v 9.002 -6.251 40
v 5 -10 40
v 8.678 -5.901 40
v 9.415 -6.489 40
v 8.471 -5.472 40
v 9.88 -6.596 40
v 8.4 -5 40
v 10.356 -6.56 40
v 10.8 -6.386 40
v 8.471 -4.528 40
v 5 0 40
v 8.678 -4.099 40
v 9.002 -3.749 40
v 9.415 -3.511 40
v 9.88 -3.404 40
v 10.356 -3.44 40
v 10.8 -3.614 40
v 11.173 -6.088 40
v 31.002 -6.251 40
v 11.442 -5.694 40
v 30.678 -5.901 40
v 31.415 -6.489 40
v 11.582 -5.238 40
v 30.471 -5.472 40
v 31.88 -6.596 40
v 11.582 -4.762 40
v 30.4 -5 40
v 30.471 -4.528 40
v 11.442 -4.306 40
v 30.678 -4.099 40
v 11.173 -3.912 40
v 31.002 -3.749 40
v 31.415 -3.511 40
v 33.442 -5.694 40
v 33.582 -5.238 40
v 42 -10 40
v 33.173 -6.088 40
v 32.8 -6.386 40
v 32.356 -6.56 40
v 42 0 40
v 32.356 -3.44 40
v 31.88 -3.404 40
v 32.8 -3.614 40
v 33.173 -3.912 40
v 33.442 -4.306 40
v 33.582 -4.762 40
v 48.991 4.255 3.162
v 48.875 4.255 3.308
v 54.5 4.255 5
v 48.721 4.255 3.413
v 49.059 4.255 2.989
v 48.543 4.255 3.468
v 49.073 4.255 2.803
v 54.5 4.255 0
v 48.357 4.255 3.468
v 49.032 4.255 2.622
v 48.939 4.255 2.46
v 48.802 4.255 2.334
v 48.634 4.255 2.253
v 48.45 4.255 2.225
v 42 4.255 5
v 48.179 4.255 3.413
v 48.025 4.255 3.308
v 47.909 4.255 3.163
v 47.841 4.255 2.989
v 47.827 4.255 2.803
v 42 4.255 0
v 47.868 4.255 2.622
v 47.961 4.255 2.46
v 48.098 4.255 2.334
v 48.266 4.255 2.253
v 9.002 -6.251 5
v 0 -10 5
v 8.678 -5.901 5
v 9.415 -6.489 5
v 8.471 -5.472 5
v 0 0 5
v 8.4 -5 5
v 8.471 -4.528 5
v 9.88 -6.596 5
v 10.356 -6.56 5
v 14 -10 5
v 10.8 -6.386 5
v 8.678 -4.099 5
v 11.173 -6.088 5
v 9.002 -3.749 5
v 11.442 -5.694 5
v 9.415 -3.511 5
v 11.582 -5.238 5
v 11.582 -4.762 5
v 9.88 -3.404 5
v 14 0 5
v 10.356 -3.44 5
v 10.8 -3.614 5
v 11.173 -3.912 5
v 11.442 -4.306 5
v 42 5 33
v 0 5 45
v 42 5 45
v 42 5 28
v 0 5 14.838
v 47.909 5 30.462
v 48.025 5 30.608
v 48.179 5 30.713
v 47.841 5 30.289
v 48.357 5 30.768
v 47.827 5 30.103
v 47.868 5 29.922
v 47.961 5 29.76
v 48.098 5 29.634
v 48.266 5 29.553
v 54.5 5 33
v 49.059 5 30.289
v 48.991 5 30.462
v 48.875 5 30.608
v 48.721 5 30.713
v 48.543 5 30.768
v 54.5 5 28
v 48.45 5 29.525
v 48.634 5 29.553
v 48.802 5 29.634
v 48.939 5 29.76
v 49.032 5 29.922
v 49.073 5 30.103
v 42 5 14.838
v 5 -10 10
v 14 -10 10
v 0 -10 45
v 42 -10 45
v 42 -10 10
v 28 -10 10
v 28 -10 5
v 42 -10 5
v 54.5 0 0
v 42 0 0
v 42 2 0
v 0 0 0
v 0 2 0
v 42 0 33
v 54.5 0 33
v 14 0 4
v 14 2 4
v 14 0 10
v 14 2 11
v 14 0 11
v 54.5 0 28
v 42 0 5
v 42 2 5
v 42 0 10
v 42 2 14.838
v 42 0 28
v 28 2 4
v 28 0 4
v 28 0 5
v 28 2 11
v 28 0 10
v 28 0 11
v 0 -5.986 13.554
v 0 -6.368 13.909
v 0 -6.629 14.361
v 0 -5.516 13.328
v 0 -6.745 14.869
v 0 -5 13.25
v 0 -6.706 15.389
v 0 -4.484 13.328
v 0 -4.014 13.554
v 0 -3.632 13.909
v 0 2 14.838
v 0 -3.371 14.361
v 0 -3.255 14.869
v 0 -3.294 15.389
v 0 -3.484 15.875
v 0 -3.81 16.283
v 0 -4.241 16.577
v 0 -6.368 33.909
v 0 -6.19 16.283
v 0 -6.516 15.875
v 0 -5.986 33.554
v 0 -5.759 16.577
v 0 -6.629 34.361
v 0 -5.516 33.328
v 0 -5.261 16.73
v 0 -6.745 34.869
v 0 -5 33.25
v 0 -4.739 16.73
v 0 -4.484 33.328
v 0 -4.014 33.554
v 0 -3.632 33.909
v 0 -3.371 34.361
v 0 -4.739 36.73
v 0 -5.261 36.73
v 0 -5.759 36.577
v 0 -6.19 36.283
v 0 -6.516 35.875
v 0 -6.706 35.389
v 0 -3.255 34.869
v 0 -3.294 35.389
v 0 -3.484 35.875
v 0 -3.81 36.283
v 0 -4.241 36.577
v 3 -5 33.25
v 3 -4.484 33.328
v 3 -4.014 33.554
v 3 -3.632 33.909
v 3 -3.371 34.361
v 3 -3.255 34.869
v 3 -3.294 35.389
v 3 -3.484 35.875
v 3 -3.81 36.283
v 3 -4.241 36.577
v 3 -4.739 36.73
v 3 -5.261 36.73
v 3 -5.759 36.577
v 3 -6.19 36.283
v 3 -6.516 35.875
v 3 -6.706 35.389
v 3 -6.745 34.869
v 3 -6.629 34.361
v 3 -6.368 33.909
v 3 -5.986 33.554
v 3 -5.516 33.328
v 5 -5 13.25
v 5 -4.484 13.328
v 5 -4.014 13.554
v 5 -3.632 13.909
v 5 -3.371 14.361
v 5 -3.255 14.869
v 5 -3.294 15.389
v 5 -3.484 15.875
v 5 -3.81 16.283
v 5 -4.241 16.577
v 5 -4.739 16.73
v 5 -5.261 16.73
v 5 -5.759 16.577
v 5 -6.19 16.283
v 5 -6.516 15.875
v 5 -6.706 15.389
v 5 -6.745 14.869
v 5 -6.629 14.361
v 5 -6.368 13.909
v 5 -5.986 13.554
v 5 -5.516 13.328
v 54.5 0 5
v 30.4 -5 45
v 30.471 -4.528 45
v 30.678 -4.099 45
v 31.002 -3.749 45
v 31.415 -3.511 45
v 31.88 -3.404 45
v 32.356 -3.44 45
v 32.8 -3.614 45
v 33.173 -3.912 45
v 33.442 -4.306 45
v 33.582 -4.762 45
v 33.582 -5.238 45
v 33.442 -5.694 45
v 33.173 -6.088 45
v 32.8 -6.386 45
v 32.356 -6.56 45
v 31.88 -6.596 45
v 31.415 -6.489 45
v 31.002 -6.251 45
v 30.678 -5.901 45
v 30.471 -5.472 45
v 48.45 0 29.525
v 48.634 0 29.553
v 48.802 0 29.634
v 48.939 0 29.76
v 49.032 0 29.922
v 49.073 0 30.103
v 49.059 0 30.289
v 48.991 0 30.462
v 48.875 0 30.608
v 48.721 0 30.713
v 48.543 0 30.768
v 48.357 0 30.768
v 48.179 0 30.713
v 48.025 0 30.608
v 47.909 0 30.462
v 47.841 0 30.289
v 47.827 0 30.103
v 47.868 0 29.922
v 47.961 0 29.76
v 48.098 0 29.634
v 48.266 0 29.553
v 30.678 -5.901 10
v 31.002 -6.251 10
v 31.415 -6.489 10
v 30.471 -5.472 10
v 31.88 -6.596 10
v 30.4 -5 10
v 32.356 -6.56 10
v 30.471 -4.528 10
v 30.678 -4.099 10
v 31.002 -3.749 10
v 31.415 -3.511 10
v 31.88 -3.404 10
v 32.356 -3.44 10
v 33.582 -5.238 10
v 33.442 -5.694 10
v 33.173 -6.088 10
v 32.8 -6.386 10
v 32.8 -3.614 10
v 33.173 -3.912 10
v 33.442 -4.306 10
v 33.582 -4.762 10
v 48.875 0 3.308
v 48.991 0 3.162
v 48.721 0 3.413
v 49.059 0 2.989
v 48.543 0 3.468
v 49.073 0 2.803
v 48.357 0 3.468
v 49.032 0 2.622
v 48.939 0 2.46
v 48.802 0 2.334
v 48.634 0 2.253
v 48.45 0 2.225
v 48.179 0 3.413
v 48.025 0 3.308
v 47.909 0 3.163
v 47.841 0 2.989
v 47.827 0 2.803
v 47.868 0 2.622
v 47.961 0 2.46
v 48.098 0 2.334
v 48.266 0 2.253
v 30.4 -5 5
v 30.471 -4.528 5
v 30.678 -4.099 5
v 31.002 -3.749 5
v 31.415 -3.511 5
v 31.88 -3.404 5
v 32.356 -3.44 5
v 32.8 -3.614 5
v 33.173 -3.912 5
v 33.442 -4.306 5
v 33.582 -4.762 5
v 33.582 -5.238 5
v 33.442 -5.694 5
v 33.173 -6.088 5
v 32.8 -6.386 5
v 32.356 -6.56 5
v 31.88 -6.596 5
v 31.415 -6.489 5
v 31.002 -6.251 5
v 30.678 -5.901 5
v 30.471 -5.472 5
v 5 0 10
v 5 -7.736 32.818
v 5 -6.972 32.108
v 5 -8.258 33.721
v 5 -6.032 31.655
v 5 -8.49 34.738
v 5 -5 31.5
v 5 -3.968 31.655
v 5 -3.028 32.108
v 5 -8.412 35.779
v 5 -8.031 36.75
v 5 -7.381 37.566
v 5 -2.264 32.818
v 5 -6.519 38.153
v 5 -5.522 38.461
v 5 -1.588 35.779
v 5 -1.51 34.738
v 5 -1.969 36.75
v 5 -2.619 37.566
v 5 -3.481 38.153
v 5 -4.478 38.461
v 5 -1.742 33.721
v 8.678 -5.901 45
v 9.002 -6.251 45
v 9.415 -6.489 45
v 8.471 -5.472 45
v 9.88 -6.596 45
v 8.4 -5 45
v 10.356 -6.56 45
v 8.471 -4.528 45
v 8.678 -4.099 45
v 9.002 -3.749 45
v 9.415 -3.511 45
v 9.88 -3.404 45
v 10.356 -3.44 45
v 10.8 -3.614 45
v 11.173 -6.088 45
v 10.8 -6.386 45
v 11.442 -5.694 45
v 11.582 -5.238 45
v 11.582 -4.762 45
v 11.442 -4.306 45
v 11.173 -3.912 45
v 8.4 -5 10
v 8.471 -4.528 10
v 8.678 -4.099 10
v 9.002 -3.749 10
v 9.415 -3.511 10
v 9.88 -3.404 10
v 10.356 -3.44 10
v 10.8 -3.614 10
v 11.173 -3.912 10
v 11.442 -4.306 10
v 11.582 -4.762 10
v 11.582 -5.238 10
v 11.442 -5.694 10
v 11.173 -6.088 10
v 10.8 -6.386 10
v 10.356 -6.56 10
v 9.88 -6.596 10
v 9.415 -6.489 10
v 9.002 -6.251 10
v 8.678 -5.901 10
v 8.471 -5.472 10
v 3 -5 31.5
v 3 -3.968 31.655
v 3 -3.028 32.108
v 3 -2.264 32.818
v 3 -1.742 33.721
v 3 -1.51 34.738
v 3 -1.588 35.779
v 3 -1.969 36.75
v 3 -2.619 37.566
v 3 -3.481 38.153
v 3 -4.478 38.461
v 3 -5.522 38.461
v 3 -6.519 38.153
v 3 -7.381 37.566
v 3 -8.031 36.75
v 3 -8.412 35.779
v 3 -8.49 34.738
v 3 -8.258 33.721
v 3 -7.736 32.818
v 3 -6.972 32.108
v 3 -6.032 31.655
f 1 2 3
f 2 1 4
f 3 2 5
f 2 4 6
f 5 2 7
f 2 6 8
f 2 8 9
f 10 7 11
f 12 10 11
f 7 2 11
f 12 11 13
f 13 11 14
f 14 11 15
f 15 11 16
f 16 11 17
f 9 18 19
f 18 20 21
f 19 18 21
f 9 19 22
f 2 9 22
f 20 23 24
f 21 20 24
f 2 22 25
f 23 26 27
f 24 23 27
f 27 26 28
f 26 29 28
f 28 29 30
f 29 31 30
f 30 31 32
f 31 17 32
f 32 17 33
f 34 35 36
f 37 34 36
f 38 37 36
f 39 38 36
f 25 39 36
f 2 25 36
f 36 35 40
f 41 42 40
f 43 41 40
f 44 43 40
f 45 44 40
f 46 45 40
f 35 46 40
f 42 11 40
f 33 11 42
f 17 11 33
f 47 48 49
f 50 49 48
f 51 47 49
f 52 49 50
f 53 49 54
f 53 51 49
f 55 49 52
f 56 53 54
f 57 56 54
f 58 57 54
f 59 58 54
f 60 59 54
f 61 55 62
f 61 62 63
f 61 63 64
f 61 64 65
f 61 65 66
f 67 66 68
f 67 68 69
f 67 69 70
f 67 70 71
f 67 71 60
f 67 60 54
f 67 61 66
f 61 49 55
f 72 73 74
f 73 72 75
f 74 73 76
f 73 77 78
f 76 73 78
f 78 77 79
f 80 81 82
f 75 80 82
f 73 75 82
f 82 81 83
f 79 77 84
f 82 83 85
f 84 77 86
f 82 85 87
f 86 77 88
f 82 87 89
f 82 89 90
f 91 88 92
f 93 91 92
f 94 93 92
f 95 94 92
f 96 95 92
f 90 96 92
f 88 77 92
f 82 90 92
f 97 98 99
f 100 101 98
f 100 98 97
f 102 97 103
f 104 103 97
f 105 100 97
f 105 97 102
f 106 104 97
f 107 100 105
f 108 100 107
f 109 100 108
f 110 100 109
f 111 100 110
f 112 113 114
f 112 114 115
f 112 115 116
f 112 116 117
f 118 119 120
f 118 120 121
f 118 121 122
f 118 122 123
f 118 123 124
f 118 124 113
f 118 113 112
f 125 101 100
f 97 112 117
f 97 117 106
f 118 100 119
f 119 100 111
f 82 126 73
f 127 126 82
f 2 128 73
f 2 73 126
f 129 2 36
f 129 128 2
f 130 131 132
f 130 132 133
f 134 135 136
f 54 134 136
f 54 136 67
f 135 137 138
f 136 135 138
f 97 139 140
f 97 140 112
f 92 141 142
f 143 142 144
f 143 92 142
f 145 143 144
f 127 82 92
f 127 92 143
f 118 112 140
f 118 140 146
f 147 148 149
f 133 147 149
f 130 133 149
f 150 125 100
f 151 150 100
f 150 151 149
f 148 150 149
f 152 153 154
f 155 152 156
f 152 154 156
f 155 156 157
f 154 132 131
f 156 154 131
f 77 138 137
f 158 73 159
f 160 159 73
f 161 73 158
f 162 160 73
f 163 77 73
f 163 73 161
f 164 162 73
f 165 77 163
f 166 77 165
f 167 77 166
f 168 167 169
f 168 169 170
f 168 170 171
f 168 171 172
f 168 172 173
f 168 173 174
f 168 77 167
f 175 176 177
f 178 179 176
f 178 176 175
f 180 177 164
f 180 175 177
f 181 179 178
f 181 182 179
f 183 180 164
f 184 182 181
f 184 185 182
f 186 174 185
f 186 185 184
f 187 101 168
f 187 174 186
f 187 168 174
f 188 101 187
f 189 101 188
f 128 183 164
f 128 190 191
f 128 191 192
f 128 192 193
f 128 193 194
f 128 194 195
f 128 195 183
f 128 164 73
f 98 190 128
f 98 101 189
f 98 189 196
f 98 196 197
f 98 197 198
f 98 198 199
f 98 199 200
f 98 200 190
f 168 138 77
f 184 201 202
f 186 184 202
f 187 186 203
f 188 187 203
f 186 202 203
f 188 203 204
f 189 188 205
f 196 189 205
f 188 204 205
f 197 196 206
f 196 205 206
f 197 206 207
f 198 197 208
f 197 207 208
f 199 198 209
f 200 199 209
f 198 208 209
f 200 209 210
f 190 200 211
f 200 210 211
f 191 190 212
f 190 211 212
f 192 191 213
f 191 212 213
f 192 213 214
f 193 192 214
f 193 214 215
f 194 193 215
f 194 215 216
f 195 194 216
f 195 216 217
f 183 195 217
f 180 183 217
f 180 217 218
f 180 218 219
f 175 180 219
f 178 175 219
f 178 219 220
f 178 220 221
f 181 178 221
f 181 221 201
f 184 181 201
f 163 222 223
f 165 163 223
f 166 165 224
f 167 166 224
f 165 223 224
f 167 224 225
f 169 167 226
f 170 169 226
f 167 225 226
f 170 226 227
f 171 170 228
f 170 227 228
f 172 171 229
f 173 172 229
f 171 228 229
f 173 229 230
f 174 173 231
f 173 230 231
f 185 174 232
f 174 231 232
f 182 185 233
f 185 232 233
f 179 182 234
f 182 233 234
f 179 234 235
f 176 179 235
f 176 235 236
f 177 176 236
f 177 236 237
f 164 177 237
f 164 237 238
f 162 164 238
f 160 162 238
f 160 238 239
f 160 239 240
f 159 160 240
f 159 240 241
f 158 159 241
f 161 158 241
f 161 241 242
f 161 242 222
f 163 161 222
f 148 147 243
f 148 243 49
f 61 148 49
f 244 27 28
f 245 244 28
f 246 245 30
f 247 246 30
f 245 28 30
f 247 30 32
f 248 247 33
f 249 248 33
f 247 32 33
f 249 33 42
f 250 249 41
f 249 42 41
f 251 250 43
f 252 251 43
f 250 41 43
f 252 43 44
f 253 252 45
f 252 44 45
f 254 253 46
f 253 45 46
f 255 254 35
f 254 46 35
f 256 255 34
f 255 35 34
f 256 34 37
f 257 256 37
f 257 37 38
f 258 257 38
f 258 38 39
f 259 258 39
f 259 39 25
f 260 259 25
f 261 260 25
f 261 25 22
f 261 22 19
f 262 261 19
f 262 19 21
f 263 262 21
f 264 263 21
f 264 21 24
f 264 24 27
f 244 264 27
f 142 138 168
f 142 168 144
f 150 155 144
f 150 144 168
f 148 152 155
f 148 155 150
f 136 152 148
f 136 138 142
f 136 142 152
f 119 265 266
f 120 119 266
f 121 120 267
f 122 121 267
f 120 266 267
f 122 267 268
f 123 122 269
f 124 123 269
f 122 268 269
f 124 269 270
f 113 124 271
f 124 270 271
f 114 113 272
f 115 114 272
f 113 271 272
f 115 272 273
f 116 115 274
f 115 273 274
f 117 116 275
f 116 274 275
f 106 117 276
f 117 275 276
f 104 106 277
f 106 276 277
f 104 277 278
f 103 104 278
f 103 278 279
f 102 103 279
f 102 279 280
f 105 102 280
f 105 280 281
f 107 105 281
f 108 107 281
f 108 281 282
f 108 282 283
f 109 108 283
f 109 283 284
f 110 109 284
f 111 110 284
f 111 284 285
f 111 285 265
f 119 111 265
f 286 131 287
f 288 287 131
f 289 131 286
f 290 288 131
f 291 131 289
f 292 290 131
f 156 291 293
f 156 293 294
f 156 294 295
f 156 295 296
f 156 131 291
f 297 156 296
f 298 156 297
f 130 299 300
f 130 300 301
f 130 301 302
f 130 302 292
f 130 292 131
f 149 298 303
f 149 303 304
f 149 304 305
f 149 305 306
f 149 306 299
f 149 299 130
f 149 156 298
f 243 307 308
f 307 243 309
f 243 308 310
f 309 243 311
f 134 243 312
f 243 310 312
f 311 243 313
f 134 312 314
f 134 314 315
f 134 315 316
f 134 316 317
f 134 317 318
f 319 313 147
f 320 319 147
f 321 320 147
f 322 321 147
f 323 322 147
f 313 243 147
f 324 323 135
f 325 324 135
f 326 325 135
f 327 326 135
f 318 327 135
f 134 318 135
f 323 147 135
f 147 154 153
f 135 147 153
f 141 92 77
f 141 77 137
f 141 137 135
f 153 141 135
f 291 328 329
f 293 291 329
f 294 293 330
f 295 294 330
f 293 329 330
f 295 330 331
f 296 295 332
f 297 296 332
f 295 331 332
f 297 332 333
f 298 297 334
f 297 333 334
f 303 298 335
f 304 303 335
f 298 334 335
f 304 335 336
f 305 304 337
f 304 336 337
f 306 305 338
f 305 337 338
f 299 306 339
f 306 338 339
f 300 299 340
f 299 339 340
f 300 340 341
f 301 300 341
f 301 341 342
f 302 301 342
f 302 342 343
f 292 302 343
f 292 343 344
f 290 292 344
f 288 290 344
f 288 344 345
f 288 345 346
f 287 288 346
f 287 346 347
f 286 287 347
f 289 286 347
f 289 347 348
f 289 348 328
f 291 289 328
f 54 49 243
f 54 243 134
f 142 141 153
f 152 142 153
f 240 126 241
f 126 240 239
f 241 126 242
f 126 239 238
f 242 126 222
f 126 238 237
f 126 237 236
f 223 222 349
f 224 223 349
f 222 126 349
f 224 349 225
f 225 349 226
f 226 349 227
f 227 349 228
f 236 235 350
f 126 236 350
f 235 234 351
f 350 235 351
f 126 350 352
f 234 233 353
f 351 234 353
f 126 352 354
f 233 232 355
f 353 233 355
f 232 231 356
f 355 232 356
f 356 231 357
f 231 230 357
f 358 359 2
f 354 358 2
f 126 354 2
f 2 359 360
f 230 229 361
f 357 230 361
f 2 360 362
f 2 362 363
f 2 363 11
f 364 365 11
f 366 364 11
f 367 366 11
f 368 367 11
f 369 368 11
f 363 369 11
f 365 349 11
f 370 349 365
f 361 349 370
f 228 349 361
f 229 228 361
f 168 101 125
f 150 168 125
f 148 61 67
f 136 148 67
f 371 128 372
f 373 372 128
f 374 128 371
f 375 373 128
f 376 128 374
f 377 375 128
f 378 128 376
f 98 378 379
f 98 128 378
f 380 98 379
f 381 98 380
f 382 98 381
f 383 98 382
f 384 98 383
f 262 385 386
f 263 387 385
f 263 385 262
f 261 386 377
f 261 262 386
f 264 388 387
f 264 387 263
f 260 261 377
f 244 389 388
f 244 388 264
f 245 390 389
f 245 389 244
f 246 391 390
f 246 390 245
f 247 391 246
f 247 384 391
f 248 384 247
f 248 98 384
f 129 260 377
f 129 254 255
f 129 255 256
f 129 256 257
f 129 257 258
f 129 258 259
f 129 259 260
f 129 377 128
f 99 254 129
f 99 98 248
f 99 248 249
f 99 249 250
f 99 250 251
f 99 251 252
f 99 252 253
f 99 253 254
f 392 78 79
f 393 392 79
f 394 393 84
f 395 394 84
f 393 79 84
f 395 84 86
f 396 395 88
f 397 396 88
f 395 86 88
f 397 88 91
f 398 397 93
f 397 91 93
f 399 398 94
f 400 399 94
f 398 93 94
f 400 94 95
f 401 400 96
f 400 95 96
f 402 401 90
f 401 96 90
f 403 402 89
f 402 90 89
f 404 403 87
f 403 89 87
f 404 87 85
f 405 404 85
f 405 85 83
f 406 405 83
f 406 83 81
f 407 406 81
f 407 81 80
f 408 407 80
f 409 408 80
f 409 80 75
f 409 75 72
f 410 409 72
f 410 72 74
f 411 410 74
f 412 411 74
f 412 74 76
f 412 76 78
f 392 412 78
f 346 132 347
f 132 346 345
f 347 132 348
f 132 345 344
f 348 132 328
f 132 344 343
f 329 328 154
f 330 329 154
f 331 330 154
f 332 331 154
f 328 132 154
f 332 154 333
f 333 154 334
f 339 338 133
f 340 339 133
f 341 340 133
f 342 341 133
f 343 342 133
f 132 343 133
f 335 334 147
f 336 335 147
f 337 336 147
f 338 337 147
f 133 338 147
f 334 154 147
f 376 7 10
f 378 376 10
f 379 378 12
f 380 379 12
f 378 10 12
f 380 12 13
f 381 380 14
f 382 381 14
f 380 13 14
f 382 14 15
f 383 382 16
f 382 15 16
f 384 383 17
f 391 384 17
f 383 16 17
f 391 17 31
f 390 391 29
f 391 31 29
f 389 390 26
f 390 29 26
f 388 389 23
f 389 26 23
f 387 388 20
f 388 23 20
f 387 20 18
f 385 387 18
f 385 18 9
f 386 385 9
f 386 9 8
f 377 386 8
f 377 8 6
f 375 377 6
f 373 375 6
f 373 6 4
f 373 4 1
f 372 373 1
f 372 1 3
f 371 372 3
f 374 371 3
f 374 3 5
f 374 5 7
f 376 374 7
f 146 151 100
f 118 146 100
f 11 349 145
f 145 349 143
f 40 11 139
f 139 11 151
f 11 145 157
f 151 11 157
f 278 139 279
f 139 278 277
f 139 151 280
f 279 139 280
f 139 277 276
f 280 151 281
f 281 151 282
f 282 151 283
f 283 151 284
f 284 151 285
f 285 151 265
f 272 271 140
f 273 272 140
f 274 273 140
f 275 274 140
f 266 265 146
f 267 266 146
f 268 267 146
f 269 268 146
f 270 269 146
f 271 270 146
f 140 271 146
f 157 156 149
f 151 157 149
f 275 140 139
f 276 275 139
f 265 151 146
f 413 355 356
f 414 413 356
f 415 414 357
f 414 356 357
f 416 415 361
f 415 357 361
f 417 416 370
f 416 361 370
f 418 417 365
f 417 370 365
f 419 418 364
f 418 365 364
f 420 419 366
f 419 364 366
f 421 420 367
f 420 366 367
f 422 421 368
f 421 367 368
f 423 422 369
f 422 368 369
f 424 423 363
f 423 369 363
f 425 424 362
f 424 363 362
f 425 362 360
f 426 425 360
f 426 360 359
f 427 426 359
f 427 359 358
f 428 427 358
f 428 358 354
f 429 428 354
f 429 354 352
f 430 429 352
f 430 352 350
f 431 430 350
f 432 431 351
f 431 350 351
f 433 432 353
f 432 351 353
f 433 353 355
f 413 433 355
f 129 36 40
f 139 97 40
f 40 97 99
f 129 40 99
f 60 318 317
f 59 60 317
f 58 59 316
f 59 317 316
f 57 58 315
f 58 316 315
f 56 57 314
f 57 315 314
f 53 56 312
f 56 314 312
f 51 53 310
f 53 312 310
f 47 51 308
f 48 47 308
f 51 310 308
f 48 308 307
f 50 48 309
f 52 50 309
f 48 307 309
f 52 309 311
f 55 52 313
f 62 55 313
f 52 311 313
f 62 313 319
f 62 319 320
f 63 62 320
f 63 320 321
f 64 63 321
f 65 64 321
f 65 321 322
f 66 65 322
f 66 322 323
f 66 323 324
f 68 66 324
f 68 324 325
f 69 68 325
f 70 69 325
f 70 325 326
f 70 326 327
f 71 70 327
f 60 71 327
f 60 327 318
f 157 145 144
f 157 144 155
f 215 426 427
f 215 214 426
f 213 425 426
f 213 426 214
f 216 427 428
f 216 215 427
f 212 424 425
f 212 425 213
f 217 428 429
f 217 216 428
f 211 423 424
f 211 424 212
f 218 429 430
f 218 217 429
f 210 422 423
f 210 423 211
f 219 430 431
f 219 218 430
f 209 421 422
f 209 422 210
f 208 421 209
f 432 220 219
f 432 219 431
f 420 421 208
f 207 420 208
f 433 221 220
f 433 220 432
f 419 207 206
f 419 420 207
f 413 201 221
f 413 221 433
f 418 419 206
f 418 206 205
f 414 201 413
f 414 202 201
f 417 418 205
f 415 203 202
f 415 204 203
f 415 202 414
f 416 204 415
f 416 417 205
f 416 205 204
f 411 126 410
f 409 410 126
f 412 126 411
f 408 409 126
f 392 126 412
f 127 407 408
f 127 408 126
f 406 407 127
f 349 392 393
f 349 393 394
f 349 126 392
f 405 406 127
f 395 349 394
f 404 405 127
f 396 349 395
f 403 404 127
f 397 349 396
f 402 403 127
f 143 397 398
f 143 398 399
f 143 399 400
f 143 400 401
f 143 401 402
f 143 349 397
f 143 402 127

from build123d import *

# Parameters (mm, degrees)
SKETCH_1_W          = 42
SKETCH_1_H          = 45
EXTRUDE_1_DEPTH     = 5
SKETCH_2_W          = 42
SKETCH_2_H          = 5
EXTRUDE_2_DEPTH     = 10
SKETCH_3_R          = 1.6
CUT_EXTRUDE_1_DEPTH = 59.855755878
SKETCH_4_W          = 14
SKETCH_4_H          = 7
CUT_EXTRUDE_2_DEPTH = 64.356136246
SKETCH_5_W          = 42
SKETCH_5_H          = 14.838100381
CUT_EXTRUDE_3_DEPTH = 3
SKETCH_6_W          = 5
SKETCH_6_H          = 30
EXTRUDE_3_DEPTH     = 10
SKETCH_7_R          = 1.75
CUT_EXTRUDE_4_DEPTH = 60.110066825
SKETCH_8_R          = 3.5
CUT_EXTRUDE_5_DEPTH = 2
SKETCH_9_W          = 5
SKETCH_9_H          = 5
SKETCH_9_H_2        = 4.255093553
EXTRUDE_4_DEPTH     = 12.5
SKETCH_10_R         = 0.625
CUT_EXTRUDE_6_DEPTH = 72.381019886


with BuildPart() as part:
    # 草图1 → 凸台-拉伸1 (new body)
    with BuildSketch(Plane(origin=(0, 0, 0), x_dir=(1, 0, 0), z_dir=(0, 1, 0))):
        with Locations((21, -22.5)):
            Rectangle(SKETCH_1_W, SKETCH_1_H)
    extrude(amount=EXTRUDE_1_DEPTH)

    # 草图2 → 凸台-拉伸2 (add)
    with BuildSketch(Plane.XZ):
        with Locations((21, 42.5)):
            Rectangle(SKETCH_2_W, SKETCH_2_H)
        with Locations((21, 7.5)):
            Rectangle(SKETCH_2_W, SKETCH_2_H)
    extrude(amount=EXTRUDE_2_DEPTH)

    # 草图3 → 切除-拉伸1 (cut, through all)
    with BuildSketch(Plane(origin=(0, 0, 5), x_dir=(-1, 0, 0), z_dir=(0, 0, -1))):
        with Locations((-32, -5)):
            Circle(SKETCH_3_R)
        with Locations((-10, -5)):
            Circle(SKETCH_3_R)
    extrude(amount=-CUT_EXTRUDE_1_DEPTH, mode=Mode.SUBTRACT)

    # 草图4 → 切除-拉伸2 (cut, through all)
    with BuildSketch(Plane.XZ.offset(10)):
        with Locations((21, 7.5)):
            Rectangle(SKETCH_4_W, SKETCH_4_H)
    extrude(amount=-CUT_EXTRUDE_2_DEPTH, mode=Mode.SUBTRACT)

    # 草图5 → 切除-拉伸3 (cut)
    with BuildSketch(Plane(origin=(0, 5, 0), x_dir=(1, 0, 0), z_dir=(0, 1, 0))):
        with Locations((21, -7.419050191)):
            Rectangle(SKETCH_5_W, SKETCH_5_H)
    extrude(amount=-CUT_EXTRUDE_3_DEPTH, mode=Mode.SUBTRACT)

    # 草图6 → 凸台-拉伸3 (add)
    with BuildSketch(Plane.XZ):
        with Locations((2.5, 25)):
            Rectangle(SKETCH_6_W, SKETCH_6_H)
    extrude(amount=EXTRUDE_3_DEPTH)

    # 草图7 → 切除-拉伸4 (cut, through all)
    with BuildSketch(Plane(origin=(5, 0, 0), x_dir=(0, 0, -1), z_dir=(1, 0, 0))):
        with Locations((-35, -5)):
            Circle(SKETCH_7_R)
        with Locations((-15, -5)):
            Circle(SKETCH_7_R)
    extrude(amount=-CUT_EXTRUDE_4_DEPTH, mode=Mode.SUBTRACT)

    # 草图8 → 切除-拉伸5 (cut)
    with BuildSketch(Plane(origin=(5, 0, 0), x_dir=(0, 0, -1), z_dir=(1, 0, 0))):
        with Locations((-35, -5)):
            Circle(SKETCH_8_R)
    extrude(amount=-CUT_EXTRUDE_5_DEPTH, mode=Mode.SUBTRACT)

    # 草图9 → 凸台-拉伸4 (add)
    with BuildSketch(Plane(origin=(42, 0, 0), x_dir=(0, 0, -1), z_dir=(1, 0, 0))):
        with Locations((-30.5, 2.5)):
            Rectangle(SKETCH_9_W, SKETCH_9_H)
        with Locations((-2.5, 2.127546777)):
            Rectangle(SKETCH_9_W, SKETCH_9_H_2)
    extrude(amount=EXTRUDE_4_DEPTH)

    # 草图10 → 切除-拉伸6 (cut, through all)
    with BuildSketch(Plane.XZ):
        with Locations(Location((48.45, 30.15, 0), (0, 0, 270))):
            Circle(SKETCH_10_R)
        with Locations(Location((48.45, 2.85, 0), (0, 0, 270))):
            Circle(SKETCH_10_R)
    extrude(amount=-CUT_EXTRUDE_6_DEPTH, mode=Mode.SUBTRACT)


solid = part.part
